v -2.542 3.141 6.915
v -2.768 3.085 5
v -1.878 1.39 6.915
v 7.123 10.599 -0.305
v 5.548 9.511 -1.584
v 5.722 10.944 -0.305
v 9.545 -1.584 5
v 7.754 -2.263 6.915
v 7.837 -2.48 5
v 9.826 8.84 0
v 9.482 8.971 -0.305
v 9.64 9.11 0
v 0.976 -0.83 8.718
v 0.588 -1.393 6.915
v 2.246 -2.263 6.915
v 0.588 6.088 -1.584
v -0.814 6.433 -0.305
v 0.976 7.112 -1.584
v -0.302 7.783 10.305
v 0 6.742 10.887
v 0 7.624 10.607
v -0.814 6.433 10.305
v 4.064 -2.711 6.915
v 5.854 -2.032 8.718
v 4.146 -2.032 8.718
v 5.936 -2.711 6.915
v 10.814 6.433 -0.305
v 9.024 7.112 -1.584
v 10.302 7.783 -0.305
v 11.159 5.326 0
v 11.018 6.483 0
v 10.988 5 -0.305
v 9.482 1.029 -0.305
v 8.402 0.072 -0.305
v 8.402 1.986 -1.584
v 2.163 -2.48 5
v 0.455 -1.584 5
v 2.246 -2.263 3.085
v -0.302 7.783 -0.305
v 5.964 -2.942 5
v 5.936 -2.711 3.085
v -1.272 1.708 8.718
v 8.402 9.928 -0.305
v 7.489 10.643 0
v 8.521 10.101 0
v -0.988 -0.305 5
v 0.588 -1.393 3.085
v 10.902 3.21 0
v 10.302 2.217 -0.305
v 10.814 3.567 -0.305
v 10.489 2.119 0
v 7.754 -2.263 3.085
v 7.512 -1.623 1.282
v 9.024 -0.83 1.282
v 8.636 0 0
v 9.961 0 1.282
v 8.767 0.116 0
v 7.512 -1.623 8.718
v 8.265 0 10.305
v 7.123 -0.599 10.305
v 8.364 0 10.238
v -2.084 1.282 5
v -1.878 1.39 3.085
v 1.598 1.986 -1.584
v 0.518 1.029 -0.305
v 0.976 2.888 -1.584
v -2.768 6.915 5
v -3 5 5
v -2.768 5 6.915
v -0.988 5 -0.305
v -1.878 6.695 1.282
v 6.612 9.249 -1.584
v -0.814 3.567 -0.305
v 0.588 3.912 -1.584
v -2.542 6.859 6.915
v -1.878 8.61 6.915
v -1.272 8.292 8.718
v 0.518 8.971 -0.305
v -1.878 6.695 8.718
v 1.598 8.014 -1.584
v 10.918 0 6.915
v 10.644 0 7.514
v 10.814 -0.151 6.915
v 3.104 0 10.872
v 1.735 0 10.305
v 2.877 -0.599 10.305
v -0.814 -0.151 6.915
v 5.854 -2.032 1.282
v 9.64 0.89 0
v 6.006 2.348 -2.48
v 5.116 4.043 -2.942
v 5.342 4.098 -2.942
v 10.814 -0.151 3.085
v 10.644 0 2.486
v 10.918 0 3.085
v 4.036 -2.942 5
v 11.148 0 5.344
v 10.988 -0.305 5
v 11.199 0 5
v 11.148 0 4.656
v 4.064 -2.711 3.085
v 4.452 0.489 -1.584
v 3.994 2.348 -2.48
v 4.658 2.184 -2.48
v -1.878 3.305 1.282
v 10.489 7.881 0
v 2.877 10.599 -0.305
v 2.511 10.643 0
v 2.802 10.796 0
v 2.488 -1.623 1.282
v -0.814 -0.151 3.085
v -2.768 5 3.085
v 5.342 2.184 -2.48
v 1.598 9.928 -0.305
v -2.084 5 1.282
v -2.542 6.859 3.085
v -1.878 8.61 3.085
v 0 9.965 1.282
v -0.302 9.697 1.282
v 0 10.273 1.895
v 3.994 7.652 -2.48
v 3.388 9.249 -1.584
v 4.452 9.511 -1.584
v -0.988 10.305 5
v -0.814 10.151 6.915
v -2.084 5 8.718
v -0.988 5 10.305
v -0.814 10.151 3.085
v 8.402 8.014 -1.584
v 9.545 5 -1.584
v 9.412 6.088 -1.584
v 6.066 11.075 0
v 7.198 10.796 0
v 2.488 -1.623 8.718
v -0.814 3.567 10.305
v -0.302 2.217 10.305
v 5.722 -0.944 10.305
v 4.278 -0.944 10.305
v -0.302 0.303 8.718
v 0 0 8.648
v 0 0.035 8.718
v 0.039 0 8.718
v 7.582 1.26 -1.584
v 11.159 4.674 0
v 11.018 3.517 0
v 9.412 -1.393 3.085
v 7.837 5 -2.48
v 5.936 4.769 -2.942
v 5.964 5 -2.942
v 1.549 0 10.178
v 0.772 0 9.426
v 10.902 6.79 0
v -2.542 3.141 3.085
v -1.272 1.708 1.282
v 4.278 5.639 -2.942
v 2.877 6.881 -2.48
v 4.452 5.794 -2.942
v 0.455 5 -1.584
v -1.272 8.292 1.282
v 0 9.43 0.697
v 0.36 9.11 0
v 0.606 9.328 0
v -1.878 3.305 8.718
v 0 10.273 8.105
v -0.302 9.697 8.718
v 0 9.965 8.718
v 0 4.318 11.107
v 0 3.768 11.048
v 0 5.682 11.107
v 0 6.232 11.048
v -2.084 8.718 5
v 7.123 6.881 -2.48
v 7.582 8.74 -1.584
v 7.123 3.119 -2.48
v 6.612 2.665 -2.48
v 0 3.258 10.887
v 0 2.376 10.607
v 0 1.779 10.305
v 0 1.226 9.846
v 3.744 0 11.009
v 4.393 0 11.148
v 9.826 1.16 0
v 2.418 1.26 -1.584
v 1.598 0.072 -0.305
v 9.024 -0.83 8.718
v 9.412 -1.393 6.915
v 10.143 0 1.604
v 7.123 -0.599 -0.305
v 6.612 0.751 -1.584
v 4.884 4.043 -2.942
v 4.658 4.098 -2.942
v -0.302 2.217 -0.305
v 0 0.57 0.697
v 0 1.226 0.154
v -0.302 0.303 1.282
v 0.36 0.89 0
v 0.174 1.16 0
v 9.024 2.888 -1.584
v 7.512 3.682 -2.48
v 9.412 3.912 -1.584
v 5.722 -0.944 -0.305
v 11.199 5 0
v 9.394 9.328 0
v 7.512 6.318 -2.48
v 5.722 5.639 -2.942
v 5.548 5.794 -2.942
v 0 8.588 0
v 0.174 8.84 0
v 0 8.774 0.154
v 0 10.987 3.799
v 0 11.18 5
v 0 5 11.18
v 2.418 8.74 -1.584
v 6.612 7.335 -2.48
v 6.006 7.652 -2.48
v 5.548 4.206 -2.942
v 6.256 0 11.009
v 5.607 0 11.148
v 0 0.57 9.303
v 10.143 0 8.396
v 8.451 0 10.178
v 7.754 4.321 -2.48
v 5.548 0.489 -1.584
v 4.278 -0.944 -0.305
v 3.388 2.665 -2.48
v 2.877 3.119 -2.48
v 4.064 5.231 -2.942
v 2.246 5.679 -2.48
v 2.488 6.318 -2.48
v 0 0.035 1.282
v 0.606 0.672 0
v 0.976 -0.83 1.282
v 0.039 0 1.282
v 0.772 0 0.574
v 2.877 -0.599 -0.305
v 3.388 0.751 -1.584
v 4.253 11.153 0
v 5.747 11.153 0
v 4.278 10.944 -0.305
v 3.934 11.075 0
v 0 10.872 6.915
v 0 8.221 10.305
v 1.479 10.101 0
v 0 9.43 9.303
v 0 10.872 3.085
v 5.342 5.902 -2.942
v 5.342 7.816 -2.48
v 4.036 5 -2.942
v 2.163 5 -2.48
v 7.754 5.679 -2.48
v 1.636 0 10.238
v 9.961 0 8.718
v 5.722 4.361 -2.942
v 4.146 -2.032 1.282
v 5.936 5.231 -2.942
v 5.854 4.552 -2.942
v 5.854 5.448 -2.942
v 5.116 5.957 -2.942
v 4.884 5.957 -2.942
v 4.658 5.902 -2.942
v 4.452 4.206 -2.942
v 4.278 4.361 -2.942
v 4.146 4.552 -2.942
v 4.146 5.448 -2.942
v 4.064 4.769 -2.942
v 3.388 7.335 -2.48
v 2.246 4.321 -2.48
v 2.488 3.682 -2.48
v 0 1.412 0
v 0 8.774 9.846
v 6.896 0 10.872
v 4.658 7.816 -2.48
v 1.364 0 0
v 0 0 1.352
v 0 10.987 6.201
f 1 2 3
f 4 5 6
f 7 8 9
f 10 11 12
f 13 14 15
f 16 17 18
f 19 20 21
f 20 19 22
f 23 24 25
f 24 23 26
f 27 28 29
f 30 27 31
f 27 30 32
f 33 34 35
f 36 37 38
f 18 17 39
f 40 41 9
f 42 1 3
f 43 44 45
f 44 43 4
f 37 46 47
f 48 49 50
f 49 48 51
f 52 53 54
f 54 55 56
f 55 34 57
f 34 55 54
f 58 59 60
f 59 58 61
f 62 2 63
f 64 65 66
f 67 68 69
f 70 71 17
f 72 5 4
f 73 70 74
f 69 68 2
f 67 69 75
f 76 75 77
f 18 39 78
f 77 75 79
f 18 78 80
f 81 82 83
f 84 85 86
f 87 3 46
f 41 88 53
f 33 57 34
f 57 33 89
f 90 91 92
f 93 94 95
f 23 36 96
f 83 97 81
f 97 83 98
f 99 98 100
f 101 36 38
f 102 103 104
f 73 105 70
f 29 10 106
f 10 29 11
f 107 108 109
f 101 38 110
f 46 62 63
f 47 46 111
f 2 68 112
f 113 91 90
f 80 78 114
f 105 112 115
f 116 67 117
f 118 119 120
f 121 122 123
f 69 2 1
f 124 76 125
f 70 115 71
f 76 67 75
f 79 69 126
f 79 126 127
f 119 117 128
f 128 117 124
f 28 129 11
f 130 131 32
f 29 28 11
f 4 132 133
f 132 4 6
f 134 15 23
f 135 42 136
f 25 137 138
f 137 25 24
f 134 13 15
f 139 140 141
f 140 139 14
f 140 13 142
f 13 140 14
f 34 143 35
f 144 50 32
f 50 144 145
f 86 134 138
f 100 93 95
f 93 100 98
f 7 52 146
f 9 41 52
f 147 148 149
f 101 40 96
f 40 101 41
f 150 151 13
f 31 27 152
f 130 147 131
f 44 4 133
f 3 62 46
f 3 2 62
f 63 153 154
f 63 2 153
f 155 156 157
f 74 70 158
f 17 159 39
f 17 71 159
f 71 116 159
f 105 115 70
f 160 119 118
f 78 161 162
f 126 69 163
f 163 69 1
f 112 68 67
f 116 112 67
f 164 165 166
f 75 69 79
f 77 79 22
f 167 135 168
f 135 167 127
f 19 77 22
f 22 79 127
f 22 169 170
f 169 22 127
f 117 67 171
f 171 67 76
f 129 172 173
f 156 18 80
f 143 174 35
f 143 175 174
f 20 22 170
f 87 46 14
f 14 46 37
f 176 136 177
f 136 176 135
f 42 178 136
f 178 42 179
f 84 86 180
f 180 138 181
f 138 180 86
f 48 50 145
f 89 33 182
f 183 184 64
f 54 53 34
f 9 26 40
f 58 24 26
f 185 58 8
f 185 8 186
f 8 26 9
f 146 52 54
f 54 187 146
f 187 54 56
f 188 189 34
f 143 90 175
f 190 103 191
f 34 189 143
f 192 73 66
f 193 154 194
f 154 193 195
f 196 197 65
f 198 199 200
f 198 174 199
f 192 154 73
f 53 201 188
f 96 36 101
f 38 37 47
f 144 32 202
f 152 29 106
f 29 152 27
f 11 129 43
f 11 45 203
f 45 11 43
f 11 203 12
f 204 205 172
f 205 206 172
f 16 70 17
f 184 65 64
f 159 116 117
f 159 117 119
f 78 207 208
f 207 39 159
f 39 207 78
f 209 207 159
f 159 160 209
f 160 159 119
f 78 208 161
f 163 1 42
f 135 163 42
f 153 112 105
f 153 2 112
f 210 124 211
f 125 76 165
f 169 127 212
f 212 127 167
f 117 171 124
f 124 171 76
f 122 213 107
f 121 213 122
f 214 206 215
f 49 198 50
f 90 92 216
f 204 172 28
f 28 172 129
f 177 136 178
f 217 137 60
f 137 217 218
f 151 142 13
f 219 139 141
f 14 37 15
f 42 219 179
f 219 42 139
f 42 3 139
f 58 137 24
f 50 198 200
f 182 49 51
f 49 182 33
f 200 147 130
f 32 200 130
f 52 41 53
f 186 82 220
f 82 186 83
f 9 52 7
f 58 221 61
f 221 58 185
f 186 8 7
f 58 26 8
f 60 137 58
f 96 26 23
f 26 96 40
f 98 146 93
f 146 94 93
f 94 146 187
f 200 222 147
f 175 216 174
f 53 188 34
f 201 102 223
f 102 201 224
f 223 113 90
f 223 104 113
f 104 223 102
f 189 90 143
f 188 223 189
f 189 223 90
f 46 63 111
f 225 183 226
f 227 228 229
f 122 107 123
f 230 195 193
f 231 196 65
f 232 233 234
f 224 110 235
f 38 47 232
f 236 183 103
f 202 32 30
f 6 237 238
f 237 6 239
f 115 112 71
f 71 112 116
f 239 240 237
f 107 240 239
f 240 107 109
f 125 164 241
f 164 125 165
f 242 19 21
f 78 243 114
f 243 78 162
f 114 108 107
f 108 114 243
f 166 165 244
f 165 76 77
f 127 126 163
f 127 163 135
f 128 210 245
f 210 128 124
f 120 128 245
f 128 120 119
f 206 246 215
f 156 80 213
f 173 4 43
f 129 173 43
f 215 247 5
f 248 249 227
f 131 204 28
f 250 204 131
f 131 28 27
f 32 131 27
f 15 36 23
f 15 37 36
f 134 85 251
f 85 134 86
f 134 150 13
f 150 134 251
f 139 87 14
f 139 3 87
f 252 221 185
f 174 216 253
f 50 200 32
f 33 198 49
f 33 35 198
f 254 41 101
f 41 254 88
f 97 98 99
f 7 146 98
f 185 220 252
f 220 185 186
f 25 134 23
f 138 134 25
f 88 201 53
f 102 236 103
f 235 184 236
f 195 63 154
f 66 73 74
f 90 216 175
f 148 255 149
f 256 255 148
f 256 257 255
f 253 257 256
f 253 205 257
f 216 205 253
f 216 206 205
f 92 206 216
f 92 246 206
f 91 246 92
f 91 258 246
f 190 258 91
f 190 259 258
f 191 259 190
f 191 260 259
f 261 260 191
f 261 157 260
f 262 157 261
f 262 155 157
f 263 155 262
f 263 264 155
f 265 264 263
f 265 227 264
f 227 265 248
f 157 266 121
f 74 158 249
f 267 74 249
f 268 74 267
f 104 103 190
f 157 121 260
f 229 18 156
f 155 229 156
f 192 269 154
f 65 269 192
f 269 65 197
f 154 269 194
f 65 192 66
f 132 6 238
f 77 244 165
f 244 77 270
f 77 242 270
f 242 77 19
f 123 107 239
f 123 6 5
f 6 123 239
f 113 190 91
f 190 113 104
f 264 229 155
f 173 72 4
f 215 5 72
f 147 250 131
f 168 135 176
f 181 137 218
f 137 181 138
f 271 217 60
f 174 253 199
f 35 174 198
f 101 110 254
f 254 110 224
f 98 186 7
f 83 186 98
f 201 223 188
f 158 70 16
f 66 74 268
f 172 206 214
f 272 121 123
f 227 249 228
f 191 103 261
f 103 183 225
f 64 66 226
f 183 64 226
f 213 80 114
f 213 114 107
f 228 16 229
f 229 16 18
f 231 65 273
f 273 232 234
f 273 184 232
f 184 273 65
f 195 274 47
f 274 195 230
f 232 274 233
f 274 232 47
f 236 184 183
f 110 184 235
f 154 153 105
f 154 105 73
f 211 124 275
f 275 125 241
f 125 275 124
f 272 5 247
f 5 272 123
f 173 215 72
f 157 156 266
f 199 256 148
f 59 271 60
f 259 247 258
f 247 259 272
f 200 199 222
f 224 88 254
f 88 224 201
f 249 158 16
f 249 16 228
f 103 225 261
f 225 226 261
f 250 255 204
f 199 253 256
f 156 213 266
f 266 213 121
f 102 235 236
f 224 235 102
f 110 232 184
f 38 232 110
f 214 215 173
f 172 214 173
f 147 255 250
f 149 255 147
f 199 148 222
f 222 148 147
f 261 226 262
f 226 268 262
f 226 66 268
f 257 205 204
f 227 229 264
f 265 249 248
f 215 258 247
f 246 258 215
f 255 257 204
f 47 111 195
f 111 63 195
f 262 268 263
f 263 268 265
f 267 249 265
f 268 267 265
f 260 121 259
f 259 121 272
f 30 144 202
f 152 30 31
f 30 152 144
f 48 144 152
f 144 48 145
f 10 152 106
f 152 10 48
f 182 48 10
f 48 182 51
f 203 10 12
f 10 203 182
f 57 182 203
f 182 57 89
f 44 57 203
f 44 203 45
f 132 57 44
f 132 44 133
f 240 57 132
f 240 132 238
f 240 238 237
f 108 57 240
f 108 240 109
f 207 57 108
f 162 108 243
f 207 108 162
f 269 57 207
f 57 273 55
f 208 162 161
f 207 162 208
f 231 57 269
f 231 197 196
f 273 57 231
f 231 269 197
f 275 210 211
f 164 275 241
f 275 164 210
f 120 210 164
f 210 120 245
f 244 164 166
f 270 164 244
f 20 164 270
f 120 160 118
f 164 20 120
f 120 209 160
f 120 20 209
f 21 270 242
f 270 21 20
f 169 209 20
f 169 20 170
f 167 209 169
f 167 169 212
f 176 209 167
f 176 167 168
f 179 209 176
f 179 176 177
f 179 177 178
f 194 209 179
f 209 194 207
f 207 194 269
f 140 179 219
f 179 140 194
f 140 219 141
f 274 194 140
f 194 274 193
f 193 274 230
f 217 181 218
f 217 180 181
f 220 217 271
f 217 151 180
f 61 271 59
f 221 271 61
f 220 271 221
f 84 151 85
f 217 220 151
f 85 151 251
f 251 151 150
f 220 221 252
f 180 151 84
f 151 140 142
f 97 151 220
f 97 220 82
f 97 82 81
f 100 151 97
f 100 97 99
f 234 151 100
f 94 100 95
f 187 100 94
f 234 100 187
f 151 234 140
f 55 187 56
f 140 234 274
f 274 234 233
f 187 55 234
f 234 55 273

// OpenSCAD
difference() {
    translate([5, 5, 5]) {
        sphere(8);
        }
    cube(20);
}
